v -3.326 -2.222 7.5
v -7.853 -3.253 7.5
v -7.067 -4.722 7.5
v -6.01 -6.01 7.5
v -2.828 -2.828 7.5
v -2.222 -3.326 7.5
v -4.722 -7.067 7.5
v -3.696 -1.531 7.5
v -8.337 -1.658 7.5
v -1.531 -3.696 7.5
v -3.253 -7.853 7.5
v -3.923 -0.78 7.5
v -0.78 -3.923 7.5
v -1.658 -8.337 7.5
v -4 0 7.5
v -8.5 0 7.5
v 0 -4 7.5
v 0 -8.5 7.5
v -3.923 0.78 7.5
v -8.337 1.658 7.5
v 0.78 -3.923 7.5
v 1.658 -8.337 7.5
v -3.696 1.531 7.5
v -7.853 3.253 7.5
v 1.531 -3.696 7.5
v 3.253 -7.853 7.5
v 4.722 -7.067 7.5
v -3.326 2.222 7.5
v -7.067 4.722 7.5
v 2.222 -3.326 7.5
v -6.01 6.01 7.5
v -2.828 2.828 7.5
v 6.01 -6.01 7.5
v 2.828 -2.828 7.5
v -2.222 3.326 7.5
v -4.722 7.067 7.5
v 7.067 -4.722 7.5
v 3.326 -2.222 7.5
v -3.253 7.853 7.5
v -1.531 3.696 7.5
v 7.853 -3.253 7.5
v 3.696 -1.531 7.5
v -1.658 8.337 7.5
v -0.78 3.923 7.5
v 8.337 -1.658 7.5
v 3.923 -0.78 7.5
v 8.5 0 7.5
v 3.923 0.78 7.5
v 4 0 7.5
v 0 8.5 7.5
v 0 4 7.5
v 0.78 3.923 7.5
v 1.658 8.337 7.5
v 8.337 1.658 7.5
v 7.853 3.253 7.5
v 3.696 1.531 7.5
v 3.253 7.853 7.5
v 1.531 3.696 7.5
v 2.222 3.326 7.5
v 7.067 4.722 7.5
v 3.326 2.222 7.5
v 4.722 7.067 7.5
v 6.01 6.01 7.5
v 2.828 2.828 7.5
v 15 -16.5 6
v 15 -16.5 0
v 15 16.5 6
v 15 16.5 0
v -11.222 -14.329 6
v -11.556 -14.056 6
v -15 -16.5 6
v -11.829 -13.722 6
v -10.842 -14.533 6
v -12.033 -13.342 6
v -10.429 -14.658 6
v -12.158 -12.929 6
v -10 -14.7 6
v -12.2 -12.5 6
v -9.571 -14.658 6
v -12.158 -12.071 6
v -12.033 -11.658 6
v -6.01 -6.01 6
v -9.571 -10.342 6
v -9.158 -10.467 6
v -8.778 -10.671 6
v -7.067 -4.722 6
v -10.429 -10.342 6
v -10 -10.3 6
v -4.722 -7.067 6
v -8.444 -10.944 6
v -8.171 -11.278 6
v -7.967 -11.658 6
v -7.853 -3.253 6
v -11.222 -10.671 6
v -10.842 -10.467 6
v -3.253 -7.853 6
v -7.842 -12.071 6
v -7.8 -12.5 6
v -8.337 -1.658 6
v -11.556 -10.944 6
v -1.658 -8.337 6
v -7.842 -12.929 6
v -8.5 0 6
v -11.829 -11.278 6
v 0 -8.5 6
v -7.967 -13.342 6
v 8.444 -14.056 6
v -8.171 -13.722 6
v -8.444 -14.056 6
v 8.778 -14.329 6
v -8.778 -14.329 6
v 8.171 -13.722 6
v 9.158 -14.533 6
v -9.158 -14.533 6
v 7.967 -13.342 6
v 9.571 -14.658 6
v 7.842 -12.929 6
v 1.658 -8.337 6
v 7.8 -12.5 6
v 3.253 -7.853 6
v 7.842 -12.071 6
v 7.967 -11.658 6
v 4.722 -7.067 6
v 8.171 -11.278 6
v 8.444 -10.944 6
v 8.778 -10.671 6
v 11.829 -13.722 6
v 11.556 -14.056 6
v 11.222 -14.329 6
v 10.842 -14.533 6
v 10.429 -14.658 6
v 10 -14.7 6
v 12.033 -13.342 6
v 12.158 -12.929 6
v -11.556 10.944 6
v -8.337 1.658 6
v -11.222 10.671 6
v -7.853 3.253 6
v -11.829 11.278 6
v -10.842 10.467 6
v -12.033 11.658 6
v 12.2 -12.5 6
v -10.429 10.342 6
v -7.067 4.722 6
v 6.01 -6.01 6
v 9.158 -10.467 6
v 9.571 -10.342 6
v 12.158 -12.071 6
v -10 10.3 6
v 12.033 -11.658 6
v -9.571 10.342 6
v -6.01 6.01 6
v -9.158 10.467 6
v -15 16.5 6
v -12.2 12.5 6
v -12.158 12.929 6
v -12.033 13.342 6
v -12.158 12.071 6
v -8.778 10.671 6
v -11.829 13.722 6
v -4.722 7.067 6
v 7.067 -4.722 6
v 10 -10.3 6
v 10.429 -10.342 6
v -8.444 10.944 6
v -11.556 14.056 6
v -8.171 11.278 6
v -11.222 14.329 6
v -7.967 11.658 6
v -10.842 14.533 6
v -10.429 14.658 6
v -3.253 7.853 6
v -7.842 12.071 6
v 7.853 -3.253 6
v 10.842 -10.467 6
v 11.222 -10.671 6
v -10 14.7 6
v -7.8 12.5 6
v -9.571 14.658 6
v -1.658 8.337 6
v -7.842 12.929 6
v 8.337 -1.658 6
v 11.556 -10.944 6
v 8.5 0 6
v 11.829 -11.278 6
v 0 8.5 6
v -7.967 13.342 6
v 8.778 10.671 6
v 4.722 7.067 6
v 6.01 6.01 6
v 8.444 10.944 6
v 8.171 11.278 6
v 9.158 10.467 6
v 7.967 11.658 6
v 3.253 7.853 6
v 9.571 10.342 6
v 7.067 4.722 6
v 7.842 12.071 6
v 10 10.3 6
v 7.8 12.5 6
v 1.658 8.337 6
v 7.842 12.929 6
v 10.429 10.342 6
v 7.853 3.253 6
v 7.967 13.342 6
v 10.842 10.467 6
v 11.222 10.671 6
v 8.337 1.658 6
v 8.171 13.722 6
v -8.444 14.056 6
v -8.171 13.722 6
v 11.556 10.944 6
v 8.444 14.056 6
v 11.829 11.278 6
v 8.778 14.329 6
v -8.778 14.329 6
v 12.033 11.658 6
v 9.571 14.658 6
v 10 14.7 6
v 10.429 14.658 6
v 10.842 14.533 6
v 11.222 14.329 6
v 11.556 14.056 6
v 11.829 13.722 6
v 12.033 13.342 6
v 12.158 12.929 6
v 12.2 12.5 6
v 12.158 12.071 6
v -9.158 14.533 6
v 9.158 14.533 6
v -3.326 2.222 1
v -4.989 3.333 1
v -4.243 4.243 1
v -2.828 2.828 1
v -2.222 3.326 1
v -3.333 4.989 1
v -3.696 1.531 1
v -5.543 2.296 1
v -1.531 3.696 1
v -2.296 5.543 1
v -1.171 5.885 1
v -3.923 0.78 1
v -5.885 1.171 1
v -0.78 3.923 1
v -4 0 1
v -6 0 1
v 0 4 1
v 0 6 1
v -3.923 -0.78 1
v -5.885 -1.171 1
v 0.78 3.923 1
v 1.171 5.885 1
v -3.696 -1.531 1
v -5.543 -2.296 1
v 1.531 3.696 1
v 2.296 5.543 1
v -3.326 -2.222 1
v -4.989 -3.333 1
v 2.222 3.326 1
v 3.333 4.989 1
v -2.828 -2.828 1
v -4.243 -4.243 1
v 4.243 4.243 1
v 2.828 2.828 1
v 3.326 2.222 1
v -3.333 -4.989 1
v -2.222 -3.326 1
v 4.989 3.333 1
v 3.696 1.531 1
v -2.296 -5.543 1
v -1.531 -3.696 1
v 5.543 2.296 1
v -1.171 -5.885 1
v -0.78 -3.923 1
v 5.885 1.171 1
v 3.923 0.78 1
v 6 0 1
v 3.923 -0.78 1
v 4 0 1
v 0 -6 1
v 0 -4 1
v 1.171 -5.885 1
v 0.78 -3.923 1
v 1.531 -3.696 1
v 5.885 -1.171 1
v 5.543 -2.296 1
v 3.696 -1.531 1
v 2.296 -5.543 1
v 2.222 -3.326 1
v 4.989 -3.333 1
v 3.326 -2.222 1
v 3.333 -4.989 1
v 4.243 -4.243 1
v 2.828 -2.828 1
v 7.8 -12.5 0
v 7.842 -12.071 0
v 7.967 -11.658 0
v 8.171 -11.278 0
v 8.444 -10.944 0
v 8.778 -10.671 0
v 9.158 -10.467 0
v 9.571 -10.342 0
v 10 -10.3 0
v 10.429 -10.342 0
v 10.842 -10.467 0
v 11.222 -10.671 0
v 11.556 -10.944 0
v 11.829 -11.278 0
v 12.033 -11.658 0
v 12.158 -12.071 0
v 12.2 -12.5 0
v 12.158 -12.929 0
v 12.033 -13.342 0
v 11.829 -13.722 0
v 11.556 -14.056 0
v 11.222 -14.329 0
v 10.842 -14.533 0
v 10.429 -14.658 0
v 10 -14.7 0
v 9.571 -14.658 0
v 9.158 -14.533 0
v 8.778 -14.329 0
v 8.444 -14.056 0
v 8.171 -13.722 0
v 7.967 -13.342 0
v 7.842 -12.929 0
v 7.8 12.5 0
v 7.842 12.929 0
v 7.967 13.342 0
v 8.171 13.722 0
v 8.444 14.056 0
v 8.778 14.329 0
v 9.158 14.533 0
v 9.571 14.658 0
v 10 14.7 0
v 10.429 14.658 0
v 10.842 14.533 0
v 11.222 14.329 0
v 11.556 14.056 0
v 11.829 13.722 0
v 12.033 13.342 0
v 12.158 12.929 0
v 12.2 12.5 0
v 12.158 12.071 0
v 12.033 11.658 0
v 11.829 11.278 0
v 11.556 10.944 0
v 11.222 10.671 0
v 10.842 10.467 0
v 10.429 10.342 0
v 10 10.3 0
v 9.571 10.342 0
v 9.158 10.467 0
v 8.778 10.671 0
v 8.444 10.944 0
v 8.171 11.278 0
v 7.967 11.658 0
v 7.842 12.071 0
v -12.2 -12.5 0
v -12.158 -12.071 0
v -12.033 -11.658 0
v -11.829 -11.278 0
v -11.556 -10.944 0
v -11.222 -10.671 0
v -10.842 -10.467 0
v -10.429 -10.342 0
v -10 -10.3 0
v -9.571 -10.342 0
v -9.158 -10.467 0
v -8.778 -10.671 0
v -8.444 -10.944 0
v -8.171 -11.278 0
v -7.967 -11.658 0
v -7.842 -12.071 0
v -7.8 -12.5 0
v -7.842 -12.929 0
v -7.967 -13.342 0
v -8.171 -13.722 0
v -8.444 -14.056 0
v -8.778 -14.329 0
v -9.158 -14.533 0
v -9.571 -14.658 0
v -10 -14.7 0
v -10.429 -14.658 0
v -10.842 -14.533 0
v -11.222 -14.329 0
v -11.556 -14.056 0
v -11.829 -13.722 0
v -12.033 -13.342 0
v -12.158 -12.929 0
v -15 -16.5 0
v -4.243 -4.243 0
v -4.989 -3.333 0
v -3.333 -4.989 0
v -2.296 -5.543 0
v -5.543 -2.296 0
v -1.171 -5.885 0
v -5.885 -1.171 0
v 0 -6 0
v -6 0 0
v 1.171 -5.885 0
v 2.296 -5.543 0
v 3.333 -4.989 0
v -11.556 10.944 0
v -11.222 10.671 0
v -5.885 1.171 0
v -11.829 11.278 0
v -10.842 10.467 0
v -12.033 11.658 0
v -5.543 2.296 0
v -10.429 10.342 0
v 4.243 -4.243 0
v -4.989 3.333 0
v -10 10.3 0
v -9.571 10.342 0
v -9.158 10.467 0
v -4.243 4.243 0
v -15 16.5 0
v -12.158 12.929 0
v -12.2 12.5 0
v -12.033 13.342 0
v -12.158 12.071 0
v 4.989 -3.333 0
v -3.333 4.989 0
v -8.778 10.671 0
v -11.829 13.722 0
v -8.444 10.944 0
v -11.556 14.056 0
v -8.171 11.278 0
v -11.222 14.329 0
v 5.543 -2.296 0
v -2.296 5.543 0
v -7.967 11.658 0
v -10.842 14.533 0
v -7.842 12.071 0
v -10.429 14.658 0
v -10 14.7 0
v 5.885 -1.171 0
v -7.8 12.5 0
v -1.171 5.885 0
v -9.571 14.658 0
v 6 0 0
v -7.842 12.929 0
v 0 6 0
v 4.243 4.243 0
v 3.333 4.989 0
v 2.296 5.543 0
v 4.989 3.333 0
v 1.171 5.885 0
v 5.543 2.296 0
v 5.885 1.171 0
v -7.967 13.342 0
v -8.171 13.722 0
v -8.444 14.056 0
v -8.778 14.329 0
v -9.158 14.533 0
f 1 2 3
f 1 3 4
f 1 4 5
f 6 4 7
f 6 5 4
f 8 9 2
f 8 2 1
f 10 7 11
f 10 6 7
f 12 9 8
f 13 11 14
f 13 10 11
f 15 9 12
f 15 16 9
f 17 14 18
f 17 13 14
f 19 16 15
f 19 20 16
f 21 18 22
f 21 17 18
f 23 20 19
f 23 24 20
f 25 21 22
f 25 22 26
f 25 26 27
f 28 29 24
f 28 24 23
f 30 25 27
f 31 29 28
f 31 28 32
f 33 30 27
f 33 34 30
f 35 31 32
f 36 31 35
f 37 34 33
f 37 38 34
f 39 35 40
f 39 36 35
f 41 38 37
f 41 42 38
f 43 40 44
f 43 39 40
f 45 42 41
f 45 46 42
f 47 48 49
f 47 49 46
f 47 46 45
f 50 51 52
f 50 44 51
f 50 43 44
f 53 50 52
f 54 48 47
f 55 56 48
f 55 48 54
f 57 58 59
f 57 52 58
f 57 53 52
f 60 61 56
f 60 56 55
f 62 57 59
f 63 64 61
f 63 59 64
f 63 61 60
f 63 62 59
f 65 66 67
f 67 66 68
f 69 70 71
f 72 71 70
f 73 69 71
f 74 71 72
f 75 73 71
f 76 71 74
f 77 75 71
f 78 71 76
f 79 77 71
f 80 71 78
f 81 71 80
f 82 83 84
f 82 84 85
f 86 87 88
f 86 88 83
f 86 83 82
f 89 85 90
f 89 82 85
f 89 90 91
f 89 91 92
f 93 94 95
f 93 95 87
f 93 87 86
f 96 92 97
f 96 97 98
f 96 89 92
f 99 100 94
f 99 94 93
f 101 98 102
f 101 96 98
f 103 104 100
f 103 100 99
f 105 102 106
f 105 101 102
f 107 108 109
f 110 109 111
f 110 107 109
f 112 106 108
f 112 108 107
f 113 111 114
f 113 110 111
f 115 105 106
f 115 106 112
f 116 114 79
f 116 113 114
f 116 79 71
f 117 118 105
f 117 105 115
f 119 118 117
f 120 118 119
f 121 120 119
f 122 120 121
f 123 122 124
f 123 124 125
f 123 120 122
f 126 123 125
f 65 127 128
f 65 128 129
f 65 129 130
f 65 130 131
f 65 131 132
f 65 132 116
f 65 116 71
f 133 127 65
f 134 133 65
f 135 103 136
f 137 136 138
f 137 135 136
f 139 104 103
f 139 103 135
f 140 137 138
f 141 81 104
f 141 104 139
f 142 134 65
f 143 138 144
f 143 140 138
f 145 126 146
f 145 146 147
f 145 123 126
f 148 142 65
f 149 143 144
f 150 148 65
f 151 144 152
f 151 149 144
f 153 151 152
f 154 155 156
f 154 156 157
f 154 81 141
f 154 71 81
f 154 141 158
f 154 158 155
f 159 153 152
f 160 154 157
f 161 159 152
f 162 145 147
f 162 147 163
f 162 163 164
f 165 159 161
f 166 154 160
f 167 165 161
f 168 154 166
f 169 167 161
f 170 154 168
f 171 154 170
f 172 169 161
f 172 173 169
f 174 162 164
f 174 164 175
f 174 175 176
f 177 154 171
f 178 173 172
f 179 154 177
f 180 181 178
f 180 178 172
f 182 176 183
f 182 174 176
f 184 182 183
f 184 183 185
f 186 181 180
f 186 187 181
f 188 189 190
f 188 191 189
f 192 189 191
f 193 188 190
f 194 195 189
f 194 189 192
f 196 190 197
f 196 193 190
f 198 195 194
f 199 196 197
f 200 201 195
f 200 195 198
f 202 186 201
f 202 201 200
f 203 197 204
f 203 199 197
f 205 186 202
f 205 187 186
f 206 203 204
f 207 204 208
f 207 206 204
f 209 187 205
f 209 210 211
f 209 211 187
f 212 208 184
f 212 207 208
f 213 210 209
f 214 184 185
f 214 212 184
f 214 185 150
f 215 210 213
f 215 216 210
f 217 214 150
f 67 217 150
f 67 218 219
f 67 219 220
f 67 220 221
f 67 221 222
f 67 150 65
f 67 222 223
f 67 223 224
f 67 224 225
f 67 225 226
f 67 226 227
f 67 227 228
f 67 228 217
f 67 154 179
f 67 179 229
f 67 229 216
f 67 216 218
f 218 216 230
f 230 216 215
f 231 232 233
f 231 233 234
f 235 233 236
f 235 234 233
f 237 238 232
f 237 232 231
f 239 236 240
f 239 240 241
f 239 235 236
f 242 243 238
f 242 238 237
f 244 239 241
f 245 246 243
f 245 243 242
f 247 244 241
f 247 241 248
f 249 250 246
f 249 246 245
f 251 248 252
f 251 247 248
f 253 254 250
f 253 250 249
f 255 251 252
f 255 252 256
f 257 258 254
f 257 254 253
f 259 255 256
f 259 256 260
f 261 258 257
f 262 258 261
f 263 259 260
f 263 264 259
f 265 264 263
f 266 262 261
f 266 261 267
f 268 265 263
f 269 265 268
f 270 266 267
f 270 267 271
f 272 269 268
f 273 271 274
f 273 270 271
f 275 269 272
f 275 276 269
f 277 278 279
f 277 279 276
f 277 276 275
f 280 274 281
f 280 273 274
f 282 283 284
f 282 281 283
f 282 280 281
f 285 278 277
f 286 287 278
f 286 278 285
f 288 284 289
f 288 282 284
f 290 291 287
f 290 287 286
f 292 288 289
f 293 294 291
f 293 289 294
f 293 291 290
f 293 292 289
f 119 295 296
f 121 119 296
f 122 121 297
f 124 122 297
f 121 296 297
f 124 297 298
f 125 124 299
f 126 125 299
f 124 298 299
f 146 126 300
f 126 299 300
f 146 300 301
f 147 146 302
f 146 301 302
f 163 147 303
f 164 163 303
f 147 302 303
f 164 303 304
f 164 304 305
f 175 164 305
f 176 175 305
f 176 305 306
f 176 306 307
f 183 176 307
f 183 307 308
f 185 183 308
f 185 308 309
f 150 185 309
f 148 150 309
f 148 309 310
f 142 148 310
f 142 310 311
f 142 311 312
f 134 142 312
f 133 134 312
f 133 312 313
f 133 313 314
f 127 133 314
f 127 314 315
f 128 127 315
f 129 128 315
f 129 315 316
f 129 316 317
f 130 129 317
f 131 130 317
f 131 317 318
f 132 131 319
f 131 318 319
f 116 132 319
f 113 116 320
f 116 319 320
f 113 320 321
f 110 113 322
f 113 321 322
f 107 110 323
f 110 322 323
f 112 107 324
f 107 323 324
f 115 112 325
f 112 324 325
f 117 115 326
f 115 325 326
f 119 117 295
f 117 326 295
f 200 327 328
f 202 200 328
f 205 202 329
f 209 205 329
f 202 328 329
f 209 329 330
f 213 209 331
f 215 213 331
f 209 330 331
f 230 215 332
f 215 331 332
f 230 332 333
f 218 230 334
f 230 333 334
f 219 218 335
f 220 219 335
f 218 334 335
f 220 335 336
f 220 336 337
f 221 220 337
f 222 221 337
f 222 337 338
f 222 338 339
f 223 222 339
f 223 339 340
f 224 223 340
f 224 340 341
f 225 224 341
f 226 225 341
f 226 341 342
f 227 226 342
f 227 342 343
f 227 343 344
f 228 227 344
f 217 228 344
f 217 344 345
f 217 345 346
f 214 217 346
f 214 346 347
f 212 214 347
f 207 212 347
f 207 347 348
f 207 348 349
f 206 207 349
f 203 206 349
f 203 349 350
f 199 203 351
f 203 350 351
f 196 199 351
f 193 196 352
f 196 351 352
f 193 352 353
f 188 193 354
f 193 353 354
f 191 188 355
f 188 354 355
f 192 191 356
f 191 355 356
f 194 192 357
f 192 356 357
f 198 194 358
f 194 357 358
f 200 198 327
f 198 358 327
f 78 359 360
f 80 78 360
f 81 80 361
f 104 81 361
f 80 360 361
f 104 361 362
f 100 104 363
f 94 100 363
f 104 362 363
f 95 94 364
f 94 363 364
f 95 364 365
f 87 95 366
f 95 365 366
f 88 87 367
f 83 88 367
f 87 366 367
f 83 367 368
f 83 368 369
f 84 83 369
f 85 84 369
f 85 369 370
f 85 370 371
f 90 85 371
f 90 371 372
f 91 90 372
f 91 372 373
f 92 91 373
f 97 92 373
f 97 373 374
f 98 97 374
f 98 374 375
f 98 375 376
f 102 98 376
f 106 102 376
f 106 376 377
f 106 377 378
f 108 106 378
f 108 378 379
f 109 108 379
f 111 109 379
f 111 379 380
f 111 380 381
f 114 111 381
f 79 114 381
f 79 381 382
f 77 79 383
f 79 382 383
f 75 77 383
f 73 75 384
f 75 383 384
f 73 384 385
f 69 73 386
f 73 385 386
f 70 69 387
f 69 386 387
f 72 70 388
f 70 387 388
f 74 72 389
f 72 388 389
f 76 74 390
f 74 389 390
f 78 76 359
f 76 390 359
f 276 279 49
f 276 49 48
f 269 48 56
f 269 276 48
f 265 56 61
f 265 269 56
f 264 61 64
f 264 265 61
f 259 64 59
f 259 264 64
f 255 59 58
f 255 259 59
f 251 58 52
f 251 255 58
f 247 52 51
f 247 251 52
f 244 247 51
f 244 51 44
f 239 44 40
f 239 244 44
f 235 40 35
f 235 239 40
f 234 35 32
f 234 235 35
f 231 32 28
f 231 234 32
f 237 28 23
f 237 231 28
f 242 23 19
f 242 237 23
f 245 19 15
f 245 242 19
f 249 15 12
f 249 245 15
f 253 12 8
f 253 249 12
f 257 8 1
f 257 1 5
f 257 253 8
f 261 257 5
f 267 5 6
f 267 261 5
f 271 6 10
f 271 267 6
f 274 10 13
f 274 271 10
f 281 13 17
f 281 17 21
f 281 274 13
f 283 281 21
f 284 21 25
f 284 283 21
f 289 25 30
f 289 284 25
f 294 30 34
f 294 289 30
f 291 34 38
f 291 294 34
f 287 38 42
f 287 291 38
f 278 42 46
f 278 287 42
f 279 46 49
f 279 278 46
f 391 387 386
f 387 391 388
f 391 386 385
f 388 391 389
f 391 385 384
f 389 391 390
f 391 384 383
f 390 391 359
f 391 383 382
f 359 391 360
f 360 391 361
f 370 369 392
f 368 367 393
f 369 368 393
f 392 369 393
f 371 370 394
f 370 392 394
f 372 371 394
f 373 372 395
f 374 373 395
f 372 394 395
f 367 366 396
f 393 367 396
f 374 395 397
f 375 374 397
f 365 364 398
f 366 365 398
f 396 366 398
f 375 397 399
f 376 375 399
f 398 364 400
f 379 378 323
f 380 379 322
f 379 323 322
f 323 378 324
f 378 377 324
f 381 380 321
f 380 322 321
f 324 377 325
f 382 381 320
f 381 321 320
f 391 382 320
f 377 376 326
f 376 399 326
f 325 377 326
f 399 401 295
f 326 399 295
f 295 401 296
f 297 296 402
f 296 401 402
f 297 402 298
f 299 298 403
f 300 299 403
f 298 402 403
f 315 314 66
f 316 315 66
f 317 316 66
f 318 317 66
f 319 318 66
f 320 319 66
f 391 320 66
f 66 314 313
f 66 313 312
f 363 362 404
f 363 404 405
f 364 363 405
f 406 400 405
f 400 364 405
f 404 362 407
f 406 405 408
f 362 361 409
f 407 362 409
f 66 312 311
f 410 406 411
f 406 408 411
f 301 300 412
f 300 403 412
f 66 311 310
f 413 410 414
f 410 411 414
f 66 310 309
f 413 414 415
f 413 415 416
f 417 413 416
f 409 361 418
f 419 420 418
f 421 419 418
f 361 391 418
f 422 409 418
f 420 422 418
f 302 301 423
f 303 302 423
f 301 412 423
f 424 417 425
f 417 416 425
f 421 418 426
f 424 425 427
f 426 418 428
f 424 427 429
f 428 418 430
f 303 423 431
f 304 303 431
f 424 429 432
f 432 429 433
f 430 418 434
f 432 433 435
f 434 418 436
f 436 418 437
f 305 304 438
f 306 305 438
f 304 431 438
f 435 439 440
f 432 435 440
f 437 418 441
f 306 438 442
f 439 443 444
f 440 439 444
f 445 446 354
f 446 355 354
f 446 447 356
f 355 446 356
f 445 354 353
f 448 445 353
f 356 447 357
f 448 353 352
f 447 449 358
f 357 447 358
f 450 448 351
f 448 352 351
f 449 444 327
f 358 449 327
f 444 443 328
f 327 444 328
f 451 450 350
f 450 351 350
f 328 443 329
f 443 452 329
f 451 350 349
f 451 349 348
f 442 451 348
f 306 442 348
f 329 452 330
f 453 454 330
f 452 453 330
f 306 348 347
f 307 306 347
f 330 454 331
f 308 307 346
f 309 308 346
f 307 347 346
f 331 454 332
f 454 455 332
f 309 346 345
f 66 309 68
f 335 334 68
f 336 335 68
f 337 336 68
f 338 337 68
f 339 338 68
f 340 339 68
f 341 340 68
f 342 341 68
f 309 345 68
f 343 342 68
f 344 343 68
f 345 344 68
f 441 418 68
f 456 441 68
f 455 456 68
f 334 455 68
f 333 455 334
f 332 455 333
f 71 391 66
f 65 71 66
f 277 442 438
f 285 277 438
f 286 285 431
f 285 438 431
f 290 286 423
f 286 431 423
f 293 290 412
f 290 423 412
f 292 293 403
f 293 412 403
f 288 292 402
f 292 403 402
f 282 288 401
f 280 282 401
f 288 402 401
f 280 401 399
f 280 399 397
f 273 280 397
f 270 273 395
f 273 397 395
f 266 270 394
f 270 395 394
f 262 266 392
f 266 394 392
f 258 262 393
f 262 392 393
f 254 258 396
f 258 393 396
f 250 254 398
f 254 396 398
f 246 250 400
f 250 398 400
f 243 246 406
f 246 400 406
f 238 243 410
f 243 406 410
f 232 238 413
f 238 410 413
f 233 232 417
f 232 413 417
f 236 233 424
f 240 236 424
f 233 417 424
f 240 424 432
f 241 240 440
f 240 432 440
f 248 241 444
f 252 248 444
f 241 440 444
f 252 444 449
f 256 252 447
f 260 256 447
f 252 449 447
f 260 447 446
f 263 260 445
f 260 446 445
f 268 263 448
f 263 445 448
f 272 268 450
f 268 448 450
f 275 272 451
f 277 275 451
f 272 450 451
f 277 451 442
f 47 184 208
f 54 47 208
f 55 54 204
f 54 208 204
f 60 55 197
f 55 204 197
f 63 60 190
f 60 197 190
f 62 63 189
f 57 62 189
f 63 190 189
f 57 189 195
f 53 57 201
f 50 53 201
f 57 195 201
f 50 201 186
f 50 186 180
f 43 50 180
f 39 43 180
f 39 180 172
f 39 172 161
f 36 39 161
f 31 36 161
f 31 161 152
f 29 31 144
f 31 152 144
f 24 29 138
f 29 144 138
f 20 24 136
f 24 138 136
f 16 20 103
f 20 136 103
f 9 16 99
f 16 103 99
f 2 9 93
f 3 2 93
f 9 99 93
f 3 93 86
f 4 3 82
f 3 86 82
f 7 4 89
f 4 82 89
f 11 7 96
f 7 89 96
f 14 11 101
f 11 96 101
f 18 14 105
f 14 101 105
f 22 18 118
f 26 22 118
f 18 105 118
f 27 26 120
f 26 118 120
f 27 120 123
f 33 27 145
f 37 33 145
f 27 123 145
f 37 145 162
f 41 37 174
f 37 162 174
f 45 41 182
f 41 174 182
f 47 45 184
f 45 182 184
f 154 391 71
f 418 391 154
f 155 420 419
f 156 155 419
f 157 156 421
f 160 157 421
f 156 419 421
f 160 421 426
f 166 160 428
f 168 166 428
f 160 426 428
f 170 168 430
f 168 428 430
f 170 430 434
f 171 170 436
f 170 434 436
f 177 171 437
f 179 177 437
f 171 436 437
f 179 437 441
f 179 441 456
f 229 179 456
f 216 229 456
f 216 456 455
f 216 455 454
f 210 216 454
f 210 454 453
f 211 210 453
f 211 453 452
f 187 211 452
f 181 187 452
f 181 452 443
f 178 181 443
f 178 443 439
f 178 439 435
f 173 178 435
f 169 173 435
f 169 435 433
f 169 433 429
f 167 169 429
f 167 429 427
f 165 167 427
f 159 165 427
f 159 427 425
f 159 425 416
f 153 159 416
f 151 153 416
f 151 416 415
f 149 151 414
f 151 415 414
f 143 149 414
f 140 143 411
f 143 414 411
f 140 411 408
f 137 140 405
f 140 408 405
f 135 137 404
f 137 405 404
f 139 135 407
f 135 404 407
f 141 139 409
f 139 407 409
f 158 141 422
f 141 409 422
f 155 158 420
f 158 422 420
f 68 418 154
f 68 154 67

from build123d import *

# Parameters (mm, degrees)
F0_W     = 30
F0_H     = 33
F0_R     = 4
F1_DEPTH = 6
F2_R     = 8.5
F2_R_2   = 4
F3_DEPTH = 1.5
F4_R     = 6
F4_R_2   = 4
F5_DEPTH = 1
F7_D     = 4.4


with BuildPart() as f1:
    # F0 (on Top) → F1 (new body)
    with BuildSketch(Plane.XY):
        Rectangle(F0_W, F0_H)
        Circle(F0_R, mode=Mode.SUBTRACT)
    extrude(amount=F1_DEPTH)

    # F2 (on face) → F3 (join)
    with BuildSketch(Plane.XY.offset(6)):
        Circle(F2_R)
        Circle(F2_R_2, mode=Mode.SUBTRACT)
    extrude(amount=F3_DEPTH)

    # F4 (on face) → F5 (cut)
    with BuildSketch(Plane(origin=(0, 0, 0), x_dir=(1, 0, 0), z_dir=(0, 0, -1))):
        Circle(F4_R)
        Circle(F4_R_2, mode=Mode.SUBTRACT)
    extrude(amount=-F5_DEPTH, mode=Mode.SUBTRACT)

    # F7 (through all)
    with Locations(Plane.XY.offset(6)):
        with Locations((-10, 12.5), (10, 12.5), (10, -12.5), (-10, -12.5)):
            Hole(F7_D / 2)


solid = f1.part
